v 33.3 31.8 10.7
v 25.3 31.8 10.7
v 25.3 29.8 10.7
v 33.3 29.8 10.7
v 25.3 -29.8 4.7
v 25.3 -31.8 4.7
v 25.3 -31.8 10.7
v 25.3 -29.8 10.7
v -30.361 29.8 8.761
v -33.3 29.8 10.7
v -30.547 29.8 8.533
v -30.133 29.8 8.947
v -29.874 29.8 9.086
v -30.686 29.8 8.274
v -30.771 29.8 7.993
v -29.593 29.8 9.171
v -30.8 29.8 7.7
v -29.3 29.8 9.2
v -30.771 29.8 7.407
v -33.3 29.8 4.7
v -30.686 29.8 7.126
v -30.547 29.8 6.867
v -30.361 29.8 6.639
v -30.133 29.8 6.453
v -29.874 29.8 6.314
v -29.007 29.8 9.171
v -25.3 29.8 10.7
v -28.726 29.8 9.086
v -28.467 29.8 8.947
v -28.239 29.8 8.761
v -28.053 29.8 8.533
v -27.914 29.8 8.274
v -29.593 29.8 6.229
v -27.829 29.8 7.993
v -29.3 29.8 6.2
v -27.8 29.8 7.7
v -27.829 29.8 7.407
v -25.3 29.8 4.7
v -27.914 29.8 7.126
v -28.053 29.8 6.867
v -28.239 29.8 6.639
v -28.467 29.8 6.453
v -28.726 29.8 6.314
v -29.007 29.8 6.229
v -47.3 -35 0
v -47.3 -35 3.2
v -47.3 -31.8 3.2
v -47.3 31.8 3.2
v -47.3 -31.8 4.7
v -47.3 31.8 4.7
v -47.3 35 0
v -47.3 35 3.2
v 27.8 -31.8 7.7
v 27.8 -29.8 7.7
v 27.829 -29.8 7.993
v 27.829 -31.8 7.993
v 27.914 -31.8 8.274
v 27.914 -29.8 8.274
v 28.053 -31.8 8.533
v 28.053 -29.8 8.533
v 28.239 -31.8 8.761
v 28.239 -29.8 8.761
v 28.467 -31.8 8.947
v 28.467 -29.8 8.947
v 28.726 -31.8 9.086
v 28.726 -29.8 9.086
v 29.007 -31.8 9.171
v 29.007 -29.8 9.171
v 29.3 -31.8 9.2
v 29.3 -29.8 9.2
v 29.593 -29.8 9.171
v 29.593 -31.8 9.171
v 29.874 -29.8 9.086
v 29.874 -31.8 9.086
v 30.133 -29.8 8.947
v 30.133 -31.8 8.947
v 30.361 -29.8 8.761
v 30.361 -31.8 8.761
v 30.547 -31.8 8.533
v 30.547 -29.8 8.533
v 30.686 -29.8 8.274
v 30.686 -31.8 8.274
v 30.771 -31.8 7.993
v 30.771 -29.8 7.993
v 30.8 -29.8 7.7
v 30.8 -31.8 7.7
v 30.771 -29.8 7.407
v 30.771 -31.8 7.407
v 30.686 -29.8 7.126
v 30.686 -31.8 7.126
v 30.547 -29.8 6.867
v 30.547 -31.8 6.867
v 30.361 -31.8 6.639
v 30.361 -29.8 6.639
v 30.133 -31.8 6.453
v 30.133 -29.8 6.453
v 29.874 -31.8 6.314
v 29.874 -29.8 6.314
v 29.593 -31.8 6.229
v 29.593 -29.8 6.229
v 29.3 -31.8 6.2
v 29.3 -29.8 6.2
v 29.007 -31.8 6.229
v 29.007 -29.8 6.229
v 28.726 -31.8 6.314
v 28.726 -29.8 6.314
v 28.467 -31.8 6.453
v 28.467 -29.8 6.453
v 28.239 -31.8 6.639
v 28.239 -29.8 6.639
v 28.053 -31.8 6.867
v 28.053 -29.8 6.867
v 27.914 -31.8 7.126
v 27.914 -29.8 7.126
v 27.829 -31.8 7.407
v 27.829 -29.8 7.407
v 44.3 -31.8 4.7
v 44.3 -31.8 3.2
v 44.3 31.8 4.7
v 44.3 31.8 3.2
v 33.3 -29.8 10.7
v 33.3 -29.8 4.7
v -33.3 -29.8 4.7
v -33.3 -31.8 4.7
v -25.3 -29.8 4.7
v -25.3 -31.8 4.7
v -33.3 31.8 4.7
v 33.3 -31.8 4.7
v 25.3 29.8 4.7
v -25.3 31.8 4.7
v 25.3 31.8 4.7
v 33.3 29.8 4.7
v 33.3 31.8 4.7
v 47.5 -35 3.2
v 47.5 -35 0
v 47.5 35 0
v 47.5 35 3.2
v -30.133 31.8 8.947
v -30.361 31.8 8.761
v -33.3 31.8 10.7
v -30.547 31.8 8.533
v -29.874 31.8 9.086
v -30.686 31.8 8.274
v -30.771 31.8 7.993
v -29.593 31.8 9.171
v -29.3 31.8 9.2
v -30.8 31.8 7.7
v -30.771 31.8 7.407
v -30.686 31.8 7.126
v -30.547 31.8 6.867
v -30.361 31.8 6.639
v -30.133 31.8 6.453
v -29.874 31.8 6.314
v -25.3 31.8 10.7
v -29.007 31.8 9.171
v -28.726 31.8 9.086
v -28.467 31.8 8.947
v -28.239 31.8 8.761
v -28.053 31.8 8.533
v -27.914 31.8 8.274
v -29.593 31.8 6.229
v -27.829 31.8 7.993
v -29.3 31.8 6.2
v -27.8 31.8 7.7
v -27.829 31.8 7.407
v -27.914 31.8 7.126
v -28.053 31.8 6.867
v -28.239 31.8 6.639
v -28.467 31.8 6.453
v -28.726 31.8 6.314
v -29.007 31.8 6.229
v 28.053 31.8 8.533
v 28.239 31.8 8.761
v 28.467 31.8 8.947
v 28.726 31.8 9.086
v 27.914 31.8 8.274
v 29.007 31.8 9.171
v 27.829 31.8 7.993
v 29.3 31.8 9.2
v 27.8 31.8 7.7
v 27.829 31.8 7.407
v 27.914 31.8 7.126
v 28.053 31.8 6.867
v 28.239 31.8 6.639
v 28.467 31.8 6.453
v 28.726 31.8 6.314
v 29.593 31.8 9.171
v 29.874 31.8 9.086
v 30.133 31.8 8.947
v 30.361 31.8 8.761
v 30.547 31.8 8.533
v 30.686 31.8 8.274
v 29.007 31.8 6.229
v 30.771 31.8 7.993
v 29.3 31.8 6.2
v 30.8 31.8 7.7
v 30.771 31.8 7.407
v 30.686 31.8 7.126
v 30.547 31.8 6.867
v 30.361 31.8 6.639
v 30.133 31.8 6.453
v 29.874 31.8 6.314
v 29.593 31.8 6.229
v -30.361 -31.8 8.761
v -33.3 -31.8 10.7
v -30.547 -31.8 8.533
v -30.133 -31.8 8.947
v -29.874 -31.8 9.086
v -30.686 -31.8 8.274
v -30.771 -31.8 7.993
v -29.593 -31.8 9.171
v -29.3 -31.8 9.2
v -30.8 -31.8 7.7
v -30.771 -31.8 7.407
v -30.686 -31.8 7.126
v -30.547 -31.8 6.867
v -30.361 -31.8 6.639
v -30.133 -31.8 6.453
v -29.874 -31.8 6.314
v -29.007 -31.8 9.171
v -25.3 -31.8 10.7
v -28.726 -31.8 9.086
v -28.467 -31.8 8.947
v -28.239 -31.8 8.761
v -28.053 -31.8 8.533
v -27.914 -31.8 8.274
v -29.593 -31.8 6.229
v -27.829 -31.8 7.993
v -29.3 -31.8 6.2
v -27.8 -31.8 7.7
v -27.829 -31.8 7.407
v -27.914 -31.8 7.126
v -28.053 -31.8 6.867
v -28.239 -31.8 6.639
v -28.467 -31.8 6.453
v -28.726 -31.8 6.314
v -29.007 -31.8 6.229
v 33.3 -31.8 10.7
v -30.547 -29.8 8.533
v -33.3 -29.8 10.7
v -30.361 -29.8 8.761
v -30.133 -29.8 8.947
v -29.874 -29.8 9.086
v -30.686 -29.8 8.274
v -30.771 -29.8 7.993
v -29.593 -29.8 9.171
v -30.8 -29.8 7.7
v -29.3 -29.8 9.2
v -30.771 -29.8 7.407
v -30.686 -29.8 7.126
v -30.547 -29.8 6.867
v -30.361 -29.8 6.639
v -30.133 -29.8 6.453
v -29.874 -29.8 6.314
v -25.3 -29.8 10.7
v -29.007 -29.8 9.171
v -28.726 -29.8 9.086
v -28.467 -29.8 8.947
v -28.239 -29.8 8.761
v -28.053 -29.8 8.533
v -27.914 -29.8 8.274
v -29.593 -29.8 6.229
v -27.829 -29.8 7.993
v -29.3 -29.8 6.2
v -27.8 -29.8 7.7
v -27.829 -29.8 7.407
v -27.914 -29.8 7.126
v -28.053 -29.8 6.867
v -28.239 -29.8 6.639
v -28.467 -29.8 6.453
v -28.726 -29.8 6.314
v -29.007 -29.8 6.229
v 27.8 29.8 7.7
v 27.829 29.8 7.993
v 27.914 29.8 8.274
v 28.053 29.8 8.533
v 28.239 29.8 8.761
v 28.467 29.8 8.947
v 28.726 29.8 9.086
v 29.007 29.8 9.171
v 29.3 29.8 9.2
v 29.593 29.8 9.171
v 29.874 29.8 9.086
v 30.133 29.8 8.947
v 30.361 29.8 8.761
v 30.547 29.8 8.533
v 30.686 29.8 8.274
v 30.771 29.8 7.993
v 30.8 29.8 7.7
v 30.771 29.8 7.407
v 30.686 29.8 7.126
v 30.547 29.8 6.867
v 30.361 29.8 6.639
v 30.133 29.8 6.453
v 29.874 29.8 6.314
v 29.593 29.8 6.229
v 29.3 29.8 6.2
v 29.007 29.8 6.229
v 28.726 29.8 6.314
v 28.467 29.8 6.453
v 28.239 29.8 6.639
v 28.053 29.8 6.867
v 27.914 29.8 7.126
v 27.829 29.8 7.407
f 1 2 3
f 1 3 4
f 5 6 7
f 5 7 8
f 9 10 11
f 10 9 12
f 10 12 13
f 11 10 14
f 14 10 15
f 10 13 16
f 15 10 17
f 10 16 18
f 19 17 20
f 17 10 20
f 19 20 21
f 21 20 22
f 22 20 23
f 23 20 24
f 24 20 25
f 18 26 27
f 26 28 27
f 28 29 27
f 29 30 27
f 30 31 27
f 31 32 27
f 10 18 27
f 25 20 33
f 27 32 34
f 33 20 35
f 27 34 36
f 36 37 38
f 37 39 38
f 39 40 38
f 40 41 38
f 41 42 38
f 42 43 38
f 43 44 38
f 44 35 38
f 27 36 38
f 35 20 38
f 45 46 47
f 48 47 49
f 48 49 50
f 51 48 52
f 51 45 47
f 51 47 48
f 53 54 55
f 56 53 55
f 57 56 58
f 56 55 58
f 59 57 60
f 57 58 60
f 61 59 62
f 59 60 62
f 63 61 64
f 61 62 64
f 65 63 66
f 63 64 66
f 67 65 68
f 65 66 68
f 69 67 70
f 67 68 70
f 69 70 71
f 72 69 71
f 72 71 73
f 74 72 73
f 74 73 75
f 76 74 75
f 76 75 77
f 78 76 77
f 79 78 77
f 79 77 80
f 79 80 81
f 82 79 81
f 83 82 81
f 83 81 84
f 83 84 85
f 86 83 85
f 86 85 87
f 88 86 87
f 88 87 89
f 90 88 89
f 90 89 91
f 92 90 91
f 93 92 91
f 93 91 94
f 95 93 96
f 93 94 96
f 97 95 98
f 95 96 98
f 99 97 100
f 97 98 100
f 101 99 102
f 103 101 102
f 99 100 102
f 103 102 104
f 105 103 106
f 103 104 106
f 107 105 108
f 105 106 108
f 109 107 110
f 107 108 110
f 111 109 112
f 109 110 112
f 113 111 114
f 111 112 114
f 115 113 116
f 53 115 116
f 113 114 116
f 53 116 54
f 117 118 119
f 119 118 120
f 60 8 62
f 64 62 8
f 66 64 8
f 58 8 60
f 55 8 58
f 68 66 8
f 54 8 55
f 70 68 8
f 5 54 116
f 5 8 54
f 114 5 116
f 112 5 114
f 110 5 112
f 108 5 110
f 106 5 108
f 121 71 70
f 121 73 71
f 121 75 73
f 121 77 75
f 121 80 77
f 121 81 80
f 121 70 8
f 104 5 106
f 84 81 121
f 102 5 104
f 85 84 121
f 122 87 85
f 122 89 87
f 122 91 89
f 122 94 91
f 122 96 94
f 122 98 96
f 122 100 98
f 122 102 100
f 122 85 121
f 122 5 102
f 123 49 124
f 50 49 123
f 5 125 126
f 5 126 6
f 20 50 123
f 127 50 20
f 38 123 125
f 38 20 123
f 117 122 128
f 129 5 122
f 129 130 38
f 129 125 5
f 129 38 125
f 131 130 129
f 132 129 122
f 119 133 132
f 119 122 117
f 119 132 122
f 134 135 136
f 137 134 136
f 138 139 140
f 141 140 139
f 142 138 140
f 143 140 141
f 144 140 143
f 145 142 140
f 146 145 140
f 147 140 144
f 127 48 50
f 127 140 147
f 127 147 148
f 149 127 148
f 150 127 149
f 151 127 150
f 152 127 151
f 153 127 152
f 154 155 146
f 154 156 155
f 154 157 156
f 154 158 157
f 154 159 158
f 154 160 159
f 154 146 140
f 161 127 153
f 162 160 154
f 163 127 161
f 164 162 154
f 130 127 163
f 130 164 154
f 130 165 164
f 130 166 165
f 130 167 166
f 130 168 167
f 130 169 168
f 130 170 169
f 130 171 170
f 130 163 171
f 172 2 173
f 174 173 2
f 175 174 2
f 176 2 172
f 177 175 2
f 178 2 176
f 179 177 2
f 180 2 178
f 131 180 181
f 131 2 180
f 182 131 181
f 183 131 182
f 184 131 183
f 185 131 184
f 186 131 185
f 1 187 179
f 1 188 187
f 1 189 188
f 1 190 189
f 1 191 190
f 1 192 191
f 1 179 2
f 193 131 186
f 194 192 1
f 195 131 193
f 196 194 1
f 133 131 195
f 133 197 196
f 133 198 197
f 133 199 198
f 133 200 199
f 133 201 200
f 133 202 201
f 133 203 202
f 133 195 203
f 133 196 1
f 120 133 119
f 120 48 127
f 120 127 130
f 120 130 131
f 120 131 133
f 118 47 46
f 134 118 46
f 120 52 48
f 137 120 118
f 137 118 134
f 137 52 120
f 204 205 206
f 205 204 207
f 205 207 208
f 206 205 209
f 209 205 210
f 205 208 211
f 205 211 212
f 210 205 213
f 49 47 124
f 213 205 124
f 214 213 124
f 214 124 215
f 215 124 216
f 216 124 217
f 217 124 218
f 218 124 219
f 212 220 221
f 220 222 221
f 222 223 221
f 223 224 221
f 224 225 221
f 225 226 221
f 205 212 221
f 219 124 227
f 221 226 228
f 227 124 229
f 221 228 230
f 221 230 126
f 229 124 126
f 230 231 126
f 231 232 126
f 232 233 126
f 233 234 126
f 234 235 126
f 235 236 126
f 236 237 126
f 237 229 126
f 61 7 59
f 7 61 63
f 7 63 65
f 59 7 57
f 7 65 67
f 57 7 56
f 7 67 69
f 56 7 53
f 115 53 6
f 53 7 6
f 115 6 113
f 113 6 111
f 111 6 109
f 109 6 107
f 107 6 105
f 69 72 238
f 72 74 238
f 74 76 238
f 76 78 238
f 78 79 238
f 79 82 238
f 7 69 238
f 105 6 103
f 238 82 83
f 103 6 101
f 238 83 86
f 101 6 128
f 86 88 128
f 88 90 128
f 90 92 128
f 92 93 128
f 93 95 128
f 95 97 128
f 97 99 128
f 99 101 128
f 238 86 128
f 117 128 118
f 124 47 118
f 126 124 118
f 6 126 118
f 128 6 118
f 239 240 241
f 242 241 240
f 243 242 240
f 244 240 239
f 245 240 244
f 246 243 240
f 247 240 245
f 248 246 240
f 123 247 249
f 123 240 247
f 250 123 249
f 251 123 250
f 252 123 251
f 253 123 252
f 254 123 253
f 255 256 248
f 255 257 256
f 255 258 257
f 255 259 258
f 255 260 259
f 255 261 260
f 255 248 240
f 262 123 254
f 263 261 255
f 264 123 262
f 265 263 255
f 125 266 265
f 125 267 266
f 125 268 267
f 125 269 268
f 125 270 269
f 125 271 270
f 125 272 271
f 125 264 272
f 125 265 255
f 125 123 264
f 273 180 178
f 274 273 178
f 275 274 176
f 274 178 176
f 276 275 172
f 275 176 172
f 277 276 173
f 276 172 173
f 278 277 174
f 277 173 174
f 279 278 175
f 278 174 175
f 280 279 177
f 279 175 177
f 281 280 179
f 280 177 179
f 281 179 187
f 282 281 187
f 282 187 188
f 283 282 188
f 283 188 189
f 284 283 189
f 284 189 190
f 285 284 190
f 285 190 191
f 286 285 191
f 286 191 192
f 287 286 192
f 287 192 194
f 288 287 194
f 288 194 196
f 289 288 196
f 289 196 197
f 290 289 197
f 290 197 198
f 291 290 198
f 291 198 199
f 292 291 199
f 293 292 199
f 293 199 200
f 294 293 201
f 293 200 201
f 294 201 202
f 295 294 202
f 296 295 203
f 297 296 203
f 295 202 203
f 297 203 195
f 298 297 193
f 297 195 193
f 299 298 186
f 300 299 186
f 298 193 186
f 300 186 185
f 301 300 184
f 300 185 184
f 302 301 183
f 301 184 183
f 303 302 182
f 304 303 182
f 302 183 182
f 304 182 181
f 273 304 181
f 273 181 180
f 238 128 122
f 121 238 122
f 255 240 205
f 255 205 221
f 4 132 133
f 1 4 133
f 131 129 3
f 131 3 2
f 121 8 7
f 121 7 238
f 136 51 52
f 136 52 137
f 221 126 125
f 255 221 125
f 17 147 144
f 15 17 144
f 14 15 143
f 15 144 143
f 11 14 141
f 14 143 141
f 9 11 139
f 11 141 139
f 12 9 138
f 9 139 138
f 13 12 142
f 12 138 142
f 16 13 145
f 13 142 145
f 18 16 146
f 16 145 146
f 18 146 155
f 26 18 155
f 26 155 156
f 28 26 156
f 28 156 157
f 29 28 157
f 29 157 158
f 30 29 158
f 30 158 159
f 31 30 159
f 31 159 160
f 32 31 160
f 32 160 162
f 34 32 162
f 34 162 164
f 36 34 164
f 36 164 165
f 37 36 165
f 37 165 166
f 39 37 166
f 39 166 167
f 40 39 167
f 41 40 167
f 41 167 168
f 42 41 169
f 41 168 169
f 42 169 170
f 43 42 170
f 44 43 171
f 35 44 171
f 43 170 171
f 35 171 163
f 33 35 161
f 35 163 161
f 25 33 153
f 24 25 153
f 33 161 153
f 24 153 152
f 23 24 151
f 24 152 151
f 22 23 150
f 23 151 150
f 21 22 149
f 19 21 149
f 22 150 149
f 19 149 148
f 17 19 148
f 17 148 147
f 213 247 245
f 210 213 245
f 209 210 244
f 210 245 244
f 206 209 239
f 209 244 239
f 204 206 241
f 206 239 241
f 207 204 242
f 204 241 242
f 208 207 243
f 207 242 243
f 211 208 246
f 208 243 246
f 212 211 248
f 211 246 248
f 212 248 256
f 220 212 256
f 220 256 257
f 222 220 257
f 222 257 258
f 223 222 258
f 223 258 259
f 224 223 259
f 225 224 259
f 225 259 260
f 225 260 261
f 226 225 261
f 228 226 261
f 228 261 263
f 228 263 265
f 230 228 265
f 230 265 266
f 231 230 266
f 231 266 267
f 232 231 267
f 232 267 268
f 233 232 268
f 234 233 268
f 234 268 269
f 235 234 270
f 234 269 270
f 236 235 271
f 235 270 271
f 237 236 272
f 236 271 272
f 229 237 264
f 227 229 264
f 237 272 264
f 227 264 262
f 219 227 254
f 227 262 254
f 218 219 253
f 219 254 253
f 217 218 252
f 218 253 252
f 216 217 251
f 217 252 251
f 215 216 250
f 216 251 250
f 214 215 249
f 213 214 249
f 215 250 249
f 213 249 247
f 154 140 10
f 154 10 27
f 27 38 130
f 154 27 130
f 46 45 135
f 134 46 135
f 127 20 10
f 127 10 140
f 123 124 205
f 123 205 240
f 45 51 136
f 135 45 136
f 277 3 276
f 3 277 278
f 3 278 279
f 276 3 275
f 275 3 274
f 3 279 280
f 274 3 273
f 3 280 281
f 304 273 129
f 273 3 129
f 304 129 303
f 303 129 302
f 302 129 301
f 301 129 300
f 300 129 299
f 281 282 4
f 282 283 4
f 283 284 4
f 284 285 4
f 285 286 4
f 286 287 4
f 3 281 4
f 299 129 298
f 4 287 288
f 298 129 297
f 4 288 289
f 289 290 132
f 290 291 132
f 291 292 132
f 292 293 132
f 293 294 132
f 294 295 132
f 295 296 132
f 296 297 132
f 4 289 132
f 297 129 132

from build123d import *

# Parameters (mm, degrees)
SKETCH_1_W          = 94.8
SKETCH_1_H          = 70
EXTRUDE_1_DEPTH     = 3.2
SKETCH_3_W          = 88.6
SKETCH_3_H          = 63.6
EXTRUDE_2_DEPTH     = 1.5
SKETCH_4_W          = 8
SKETCH_4_H          = 2
EXTRUDE_3_DEPTH     = 6
SKETCH_5_R          = 1.5
CUT_EXTRUDE_1_DEPTH = 100
SKETCH_6_W          = 3
SKETCH_6_H          = 63.6
EXTRUDE_4_DEPTH     = 1.5


with BuildPart() as part:
    # 草图1 → 凸台-拉伸1 (new body)
    with BuildSketch(Plane.XY):
        with Locations((0.1, 0)):
            Rectangle(SKETCH_1_W, SKETCH_1_H)
    extrude(amount=EXTRUDE_1_DEPTH)

    # 草图3 → 凸台-拉伸2 (add)
    with BuildSketch(Plane.XY.offset(3.2)):
        Rectangle(SKETCH_3_W, SKETCH_3_H)
    extrude(amount=EXTRUDE_2_DEPTH)

    # 草图4 → 凸台-拉伸3 (add)
    with BuildSketch(Plane.XY.offset(4.7)):
        with Locations((29.3, 30.8)):
            Rectangle(SKETCH_4_W, SKETCH_4_H)
        with Locations((29.3, -30.8)):
            Rectangle(SKETCH_4_W, SKETCH_4_H)
        with Locations((-29.3, -30.8)):
            Rectangle(SKETCH_4_W, SKETCH_4_H)
        with Locations((-29.3, 30.8)):
            Rectangle(SKETCH_4_W, SKETCH_4_H)
    extrude(amount=EXTRUDE_3_DEPTH)

    # 草图5 → 切除-拉伸1 (cut)
    with BuildSketch(Plane(origin=(0, 31.8, 0), x_dir=(1, 0, 0), z_dir=(0, 1, 0))):
        with Locations(Location((29.3, -7.7, 0), (0, 0, 180))):
            Circle(SKETCH_5_R)
        with Locations(Location((-29.3, -7.7, 0), (0, 0, 180))):
            Circle(SKETCH_5_R)
    extrude(amount=-CUT_EXTRUDE_1_DEPTH, mode=Mode.SUBTRACT)

    # 草图6 → 凸台-拉伸4 (add)
    with BuildSketch(Plane.XY.offset(3.2)):
        with Locations((-45.8, 0)):
            Rectangle(SKETCH_6_W, SKETCH_6_H)
    extrude(amount=EXTRUDE_4_DEPTH)


solid = part.part
